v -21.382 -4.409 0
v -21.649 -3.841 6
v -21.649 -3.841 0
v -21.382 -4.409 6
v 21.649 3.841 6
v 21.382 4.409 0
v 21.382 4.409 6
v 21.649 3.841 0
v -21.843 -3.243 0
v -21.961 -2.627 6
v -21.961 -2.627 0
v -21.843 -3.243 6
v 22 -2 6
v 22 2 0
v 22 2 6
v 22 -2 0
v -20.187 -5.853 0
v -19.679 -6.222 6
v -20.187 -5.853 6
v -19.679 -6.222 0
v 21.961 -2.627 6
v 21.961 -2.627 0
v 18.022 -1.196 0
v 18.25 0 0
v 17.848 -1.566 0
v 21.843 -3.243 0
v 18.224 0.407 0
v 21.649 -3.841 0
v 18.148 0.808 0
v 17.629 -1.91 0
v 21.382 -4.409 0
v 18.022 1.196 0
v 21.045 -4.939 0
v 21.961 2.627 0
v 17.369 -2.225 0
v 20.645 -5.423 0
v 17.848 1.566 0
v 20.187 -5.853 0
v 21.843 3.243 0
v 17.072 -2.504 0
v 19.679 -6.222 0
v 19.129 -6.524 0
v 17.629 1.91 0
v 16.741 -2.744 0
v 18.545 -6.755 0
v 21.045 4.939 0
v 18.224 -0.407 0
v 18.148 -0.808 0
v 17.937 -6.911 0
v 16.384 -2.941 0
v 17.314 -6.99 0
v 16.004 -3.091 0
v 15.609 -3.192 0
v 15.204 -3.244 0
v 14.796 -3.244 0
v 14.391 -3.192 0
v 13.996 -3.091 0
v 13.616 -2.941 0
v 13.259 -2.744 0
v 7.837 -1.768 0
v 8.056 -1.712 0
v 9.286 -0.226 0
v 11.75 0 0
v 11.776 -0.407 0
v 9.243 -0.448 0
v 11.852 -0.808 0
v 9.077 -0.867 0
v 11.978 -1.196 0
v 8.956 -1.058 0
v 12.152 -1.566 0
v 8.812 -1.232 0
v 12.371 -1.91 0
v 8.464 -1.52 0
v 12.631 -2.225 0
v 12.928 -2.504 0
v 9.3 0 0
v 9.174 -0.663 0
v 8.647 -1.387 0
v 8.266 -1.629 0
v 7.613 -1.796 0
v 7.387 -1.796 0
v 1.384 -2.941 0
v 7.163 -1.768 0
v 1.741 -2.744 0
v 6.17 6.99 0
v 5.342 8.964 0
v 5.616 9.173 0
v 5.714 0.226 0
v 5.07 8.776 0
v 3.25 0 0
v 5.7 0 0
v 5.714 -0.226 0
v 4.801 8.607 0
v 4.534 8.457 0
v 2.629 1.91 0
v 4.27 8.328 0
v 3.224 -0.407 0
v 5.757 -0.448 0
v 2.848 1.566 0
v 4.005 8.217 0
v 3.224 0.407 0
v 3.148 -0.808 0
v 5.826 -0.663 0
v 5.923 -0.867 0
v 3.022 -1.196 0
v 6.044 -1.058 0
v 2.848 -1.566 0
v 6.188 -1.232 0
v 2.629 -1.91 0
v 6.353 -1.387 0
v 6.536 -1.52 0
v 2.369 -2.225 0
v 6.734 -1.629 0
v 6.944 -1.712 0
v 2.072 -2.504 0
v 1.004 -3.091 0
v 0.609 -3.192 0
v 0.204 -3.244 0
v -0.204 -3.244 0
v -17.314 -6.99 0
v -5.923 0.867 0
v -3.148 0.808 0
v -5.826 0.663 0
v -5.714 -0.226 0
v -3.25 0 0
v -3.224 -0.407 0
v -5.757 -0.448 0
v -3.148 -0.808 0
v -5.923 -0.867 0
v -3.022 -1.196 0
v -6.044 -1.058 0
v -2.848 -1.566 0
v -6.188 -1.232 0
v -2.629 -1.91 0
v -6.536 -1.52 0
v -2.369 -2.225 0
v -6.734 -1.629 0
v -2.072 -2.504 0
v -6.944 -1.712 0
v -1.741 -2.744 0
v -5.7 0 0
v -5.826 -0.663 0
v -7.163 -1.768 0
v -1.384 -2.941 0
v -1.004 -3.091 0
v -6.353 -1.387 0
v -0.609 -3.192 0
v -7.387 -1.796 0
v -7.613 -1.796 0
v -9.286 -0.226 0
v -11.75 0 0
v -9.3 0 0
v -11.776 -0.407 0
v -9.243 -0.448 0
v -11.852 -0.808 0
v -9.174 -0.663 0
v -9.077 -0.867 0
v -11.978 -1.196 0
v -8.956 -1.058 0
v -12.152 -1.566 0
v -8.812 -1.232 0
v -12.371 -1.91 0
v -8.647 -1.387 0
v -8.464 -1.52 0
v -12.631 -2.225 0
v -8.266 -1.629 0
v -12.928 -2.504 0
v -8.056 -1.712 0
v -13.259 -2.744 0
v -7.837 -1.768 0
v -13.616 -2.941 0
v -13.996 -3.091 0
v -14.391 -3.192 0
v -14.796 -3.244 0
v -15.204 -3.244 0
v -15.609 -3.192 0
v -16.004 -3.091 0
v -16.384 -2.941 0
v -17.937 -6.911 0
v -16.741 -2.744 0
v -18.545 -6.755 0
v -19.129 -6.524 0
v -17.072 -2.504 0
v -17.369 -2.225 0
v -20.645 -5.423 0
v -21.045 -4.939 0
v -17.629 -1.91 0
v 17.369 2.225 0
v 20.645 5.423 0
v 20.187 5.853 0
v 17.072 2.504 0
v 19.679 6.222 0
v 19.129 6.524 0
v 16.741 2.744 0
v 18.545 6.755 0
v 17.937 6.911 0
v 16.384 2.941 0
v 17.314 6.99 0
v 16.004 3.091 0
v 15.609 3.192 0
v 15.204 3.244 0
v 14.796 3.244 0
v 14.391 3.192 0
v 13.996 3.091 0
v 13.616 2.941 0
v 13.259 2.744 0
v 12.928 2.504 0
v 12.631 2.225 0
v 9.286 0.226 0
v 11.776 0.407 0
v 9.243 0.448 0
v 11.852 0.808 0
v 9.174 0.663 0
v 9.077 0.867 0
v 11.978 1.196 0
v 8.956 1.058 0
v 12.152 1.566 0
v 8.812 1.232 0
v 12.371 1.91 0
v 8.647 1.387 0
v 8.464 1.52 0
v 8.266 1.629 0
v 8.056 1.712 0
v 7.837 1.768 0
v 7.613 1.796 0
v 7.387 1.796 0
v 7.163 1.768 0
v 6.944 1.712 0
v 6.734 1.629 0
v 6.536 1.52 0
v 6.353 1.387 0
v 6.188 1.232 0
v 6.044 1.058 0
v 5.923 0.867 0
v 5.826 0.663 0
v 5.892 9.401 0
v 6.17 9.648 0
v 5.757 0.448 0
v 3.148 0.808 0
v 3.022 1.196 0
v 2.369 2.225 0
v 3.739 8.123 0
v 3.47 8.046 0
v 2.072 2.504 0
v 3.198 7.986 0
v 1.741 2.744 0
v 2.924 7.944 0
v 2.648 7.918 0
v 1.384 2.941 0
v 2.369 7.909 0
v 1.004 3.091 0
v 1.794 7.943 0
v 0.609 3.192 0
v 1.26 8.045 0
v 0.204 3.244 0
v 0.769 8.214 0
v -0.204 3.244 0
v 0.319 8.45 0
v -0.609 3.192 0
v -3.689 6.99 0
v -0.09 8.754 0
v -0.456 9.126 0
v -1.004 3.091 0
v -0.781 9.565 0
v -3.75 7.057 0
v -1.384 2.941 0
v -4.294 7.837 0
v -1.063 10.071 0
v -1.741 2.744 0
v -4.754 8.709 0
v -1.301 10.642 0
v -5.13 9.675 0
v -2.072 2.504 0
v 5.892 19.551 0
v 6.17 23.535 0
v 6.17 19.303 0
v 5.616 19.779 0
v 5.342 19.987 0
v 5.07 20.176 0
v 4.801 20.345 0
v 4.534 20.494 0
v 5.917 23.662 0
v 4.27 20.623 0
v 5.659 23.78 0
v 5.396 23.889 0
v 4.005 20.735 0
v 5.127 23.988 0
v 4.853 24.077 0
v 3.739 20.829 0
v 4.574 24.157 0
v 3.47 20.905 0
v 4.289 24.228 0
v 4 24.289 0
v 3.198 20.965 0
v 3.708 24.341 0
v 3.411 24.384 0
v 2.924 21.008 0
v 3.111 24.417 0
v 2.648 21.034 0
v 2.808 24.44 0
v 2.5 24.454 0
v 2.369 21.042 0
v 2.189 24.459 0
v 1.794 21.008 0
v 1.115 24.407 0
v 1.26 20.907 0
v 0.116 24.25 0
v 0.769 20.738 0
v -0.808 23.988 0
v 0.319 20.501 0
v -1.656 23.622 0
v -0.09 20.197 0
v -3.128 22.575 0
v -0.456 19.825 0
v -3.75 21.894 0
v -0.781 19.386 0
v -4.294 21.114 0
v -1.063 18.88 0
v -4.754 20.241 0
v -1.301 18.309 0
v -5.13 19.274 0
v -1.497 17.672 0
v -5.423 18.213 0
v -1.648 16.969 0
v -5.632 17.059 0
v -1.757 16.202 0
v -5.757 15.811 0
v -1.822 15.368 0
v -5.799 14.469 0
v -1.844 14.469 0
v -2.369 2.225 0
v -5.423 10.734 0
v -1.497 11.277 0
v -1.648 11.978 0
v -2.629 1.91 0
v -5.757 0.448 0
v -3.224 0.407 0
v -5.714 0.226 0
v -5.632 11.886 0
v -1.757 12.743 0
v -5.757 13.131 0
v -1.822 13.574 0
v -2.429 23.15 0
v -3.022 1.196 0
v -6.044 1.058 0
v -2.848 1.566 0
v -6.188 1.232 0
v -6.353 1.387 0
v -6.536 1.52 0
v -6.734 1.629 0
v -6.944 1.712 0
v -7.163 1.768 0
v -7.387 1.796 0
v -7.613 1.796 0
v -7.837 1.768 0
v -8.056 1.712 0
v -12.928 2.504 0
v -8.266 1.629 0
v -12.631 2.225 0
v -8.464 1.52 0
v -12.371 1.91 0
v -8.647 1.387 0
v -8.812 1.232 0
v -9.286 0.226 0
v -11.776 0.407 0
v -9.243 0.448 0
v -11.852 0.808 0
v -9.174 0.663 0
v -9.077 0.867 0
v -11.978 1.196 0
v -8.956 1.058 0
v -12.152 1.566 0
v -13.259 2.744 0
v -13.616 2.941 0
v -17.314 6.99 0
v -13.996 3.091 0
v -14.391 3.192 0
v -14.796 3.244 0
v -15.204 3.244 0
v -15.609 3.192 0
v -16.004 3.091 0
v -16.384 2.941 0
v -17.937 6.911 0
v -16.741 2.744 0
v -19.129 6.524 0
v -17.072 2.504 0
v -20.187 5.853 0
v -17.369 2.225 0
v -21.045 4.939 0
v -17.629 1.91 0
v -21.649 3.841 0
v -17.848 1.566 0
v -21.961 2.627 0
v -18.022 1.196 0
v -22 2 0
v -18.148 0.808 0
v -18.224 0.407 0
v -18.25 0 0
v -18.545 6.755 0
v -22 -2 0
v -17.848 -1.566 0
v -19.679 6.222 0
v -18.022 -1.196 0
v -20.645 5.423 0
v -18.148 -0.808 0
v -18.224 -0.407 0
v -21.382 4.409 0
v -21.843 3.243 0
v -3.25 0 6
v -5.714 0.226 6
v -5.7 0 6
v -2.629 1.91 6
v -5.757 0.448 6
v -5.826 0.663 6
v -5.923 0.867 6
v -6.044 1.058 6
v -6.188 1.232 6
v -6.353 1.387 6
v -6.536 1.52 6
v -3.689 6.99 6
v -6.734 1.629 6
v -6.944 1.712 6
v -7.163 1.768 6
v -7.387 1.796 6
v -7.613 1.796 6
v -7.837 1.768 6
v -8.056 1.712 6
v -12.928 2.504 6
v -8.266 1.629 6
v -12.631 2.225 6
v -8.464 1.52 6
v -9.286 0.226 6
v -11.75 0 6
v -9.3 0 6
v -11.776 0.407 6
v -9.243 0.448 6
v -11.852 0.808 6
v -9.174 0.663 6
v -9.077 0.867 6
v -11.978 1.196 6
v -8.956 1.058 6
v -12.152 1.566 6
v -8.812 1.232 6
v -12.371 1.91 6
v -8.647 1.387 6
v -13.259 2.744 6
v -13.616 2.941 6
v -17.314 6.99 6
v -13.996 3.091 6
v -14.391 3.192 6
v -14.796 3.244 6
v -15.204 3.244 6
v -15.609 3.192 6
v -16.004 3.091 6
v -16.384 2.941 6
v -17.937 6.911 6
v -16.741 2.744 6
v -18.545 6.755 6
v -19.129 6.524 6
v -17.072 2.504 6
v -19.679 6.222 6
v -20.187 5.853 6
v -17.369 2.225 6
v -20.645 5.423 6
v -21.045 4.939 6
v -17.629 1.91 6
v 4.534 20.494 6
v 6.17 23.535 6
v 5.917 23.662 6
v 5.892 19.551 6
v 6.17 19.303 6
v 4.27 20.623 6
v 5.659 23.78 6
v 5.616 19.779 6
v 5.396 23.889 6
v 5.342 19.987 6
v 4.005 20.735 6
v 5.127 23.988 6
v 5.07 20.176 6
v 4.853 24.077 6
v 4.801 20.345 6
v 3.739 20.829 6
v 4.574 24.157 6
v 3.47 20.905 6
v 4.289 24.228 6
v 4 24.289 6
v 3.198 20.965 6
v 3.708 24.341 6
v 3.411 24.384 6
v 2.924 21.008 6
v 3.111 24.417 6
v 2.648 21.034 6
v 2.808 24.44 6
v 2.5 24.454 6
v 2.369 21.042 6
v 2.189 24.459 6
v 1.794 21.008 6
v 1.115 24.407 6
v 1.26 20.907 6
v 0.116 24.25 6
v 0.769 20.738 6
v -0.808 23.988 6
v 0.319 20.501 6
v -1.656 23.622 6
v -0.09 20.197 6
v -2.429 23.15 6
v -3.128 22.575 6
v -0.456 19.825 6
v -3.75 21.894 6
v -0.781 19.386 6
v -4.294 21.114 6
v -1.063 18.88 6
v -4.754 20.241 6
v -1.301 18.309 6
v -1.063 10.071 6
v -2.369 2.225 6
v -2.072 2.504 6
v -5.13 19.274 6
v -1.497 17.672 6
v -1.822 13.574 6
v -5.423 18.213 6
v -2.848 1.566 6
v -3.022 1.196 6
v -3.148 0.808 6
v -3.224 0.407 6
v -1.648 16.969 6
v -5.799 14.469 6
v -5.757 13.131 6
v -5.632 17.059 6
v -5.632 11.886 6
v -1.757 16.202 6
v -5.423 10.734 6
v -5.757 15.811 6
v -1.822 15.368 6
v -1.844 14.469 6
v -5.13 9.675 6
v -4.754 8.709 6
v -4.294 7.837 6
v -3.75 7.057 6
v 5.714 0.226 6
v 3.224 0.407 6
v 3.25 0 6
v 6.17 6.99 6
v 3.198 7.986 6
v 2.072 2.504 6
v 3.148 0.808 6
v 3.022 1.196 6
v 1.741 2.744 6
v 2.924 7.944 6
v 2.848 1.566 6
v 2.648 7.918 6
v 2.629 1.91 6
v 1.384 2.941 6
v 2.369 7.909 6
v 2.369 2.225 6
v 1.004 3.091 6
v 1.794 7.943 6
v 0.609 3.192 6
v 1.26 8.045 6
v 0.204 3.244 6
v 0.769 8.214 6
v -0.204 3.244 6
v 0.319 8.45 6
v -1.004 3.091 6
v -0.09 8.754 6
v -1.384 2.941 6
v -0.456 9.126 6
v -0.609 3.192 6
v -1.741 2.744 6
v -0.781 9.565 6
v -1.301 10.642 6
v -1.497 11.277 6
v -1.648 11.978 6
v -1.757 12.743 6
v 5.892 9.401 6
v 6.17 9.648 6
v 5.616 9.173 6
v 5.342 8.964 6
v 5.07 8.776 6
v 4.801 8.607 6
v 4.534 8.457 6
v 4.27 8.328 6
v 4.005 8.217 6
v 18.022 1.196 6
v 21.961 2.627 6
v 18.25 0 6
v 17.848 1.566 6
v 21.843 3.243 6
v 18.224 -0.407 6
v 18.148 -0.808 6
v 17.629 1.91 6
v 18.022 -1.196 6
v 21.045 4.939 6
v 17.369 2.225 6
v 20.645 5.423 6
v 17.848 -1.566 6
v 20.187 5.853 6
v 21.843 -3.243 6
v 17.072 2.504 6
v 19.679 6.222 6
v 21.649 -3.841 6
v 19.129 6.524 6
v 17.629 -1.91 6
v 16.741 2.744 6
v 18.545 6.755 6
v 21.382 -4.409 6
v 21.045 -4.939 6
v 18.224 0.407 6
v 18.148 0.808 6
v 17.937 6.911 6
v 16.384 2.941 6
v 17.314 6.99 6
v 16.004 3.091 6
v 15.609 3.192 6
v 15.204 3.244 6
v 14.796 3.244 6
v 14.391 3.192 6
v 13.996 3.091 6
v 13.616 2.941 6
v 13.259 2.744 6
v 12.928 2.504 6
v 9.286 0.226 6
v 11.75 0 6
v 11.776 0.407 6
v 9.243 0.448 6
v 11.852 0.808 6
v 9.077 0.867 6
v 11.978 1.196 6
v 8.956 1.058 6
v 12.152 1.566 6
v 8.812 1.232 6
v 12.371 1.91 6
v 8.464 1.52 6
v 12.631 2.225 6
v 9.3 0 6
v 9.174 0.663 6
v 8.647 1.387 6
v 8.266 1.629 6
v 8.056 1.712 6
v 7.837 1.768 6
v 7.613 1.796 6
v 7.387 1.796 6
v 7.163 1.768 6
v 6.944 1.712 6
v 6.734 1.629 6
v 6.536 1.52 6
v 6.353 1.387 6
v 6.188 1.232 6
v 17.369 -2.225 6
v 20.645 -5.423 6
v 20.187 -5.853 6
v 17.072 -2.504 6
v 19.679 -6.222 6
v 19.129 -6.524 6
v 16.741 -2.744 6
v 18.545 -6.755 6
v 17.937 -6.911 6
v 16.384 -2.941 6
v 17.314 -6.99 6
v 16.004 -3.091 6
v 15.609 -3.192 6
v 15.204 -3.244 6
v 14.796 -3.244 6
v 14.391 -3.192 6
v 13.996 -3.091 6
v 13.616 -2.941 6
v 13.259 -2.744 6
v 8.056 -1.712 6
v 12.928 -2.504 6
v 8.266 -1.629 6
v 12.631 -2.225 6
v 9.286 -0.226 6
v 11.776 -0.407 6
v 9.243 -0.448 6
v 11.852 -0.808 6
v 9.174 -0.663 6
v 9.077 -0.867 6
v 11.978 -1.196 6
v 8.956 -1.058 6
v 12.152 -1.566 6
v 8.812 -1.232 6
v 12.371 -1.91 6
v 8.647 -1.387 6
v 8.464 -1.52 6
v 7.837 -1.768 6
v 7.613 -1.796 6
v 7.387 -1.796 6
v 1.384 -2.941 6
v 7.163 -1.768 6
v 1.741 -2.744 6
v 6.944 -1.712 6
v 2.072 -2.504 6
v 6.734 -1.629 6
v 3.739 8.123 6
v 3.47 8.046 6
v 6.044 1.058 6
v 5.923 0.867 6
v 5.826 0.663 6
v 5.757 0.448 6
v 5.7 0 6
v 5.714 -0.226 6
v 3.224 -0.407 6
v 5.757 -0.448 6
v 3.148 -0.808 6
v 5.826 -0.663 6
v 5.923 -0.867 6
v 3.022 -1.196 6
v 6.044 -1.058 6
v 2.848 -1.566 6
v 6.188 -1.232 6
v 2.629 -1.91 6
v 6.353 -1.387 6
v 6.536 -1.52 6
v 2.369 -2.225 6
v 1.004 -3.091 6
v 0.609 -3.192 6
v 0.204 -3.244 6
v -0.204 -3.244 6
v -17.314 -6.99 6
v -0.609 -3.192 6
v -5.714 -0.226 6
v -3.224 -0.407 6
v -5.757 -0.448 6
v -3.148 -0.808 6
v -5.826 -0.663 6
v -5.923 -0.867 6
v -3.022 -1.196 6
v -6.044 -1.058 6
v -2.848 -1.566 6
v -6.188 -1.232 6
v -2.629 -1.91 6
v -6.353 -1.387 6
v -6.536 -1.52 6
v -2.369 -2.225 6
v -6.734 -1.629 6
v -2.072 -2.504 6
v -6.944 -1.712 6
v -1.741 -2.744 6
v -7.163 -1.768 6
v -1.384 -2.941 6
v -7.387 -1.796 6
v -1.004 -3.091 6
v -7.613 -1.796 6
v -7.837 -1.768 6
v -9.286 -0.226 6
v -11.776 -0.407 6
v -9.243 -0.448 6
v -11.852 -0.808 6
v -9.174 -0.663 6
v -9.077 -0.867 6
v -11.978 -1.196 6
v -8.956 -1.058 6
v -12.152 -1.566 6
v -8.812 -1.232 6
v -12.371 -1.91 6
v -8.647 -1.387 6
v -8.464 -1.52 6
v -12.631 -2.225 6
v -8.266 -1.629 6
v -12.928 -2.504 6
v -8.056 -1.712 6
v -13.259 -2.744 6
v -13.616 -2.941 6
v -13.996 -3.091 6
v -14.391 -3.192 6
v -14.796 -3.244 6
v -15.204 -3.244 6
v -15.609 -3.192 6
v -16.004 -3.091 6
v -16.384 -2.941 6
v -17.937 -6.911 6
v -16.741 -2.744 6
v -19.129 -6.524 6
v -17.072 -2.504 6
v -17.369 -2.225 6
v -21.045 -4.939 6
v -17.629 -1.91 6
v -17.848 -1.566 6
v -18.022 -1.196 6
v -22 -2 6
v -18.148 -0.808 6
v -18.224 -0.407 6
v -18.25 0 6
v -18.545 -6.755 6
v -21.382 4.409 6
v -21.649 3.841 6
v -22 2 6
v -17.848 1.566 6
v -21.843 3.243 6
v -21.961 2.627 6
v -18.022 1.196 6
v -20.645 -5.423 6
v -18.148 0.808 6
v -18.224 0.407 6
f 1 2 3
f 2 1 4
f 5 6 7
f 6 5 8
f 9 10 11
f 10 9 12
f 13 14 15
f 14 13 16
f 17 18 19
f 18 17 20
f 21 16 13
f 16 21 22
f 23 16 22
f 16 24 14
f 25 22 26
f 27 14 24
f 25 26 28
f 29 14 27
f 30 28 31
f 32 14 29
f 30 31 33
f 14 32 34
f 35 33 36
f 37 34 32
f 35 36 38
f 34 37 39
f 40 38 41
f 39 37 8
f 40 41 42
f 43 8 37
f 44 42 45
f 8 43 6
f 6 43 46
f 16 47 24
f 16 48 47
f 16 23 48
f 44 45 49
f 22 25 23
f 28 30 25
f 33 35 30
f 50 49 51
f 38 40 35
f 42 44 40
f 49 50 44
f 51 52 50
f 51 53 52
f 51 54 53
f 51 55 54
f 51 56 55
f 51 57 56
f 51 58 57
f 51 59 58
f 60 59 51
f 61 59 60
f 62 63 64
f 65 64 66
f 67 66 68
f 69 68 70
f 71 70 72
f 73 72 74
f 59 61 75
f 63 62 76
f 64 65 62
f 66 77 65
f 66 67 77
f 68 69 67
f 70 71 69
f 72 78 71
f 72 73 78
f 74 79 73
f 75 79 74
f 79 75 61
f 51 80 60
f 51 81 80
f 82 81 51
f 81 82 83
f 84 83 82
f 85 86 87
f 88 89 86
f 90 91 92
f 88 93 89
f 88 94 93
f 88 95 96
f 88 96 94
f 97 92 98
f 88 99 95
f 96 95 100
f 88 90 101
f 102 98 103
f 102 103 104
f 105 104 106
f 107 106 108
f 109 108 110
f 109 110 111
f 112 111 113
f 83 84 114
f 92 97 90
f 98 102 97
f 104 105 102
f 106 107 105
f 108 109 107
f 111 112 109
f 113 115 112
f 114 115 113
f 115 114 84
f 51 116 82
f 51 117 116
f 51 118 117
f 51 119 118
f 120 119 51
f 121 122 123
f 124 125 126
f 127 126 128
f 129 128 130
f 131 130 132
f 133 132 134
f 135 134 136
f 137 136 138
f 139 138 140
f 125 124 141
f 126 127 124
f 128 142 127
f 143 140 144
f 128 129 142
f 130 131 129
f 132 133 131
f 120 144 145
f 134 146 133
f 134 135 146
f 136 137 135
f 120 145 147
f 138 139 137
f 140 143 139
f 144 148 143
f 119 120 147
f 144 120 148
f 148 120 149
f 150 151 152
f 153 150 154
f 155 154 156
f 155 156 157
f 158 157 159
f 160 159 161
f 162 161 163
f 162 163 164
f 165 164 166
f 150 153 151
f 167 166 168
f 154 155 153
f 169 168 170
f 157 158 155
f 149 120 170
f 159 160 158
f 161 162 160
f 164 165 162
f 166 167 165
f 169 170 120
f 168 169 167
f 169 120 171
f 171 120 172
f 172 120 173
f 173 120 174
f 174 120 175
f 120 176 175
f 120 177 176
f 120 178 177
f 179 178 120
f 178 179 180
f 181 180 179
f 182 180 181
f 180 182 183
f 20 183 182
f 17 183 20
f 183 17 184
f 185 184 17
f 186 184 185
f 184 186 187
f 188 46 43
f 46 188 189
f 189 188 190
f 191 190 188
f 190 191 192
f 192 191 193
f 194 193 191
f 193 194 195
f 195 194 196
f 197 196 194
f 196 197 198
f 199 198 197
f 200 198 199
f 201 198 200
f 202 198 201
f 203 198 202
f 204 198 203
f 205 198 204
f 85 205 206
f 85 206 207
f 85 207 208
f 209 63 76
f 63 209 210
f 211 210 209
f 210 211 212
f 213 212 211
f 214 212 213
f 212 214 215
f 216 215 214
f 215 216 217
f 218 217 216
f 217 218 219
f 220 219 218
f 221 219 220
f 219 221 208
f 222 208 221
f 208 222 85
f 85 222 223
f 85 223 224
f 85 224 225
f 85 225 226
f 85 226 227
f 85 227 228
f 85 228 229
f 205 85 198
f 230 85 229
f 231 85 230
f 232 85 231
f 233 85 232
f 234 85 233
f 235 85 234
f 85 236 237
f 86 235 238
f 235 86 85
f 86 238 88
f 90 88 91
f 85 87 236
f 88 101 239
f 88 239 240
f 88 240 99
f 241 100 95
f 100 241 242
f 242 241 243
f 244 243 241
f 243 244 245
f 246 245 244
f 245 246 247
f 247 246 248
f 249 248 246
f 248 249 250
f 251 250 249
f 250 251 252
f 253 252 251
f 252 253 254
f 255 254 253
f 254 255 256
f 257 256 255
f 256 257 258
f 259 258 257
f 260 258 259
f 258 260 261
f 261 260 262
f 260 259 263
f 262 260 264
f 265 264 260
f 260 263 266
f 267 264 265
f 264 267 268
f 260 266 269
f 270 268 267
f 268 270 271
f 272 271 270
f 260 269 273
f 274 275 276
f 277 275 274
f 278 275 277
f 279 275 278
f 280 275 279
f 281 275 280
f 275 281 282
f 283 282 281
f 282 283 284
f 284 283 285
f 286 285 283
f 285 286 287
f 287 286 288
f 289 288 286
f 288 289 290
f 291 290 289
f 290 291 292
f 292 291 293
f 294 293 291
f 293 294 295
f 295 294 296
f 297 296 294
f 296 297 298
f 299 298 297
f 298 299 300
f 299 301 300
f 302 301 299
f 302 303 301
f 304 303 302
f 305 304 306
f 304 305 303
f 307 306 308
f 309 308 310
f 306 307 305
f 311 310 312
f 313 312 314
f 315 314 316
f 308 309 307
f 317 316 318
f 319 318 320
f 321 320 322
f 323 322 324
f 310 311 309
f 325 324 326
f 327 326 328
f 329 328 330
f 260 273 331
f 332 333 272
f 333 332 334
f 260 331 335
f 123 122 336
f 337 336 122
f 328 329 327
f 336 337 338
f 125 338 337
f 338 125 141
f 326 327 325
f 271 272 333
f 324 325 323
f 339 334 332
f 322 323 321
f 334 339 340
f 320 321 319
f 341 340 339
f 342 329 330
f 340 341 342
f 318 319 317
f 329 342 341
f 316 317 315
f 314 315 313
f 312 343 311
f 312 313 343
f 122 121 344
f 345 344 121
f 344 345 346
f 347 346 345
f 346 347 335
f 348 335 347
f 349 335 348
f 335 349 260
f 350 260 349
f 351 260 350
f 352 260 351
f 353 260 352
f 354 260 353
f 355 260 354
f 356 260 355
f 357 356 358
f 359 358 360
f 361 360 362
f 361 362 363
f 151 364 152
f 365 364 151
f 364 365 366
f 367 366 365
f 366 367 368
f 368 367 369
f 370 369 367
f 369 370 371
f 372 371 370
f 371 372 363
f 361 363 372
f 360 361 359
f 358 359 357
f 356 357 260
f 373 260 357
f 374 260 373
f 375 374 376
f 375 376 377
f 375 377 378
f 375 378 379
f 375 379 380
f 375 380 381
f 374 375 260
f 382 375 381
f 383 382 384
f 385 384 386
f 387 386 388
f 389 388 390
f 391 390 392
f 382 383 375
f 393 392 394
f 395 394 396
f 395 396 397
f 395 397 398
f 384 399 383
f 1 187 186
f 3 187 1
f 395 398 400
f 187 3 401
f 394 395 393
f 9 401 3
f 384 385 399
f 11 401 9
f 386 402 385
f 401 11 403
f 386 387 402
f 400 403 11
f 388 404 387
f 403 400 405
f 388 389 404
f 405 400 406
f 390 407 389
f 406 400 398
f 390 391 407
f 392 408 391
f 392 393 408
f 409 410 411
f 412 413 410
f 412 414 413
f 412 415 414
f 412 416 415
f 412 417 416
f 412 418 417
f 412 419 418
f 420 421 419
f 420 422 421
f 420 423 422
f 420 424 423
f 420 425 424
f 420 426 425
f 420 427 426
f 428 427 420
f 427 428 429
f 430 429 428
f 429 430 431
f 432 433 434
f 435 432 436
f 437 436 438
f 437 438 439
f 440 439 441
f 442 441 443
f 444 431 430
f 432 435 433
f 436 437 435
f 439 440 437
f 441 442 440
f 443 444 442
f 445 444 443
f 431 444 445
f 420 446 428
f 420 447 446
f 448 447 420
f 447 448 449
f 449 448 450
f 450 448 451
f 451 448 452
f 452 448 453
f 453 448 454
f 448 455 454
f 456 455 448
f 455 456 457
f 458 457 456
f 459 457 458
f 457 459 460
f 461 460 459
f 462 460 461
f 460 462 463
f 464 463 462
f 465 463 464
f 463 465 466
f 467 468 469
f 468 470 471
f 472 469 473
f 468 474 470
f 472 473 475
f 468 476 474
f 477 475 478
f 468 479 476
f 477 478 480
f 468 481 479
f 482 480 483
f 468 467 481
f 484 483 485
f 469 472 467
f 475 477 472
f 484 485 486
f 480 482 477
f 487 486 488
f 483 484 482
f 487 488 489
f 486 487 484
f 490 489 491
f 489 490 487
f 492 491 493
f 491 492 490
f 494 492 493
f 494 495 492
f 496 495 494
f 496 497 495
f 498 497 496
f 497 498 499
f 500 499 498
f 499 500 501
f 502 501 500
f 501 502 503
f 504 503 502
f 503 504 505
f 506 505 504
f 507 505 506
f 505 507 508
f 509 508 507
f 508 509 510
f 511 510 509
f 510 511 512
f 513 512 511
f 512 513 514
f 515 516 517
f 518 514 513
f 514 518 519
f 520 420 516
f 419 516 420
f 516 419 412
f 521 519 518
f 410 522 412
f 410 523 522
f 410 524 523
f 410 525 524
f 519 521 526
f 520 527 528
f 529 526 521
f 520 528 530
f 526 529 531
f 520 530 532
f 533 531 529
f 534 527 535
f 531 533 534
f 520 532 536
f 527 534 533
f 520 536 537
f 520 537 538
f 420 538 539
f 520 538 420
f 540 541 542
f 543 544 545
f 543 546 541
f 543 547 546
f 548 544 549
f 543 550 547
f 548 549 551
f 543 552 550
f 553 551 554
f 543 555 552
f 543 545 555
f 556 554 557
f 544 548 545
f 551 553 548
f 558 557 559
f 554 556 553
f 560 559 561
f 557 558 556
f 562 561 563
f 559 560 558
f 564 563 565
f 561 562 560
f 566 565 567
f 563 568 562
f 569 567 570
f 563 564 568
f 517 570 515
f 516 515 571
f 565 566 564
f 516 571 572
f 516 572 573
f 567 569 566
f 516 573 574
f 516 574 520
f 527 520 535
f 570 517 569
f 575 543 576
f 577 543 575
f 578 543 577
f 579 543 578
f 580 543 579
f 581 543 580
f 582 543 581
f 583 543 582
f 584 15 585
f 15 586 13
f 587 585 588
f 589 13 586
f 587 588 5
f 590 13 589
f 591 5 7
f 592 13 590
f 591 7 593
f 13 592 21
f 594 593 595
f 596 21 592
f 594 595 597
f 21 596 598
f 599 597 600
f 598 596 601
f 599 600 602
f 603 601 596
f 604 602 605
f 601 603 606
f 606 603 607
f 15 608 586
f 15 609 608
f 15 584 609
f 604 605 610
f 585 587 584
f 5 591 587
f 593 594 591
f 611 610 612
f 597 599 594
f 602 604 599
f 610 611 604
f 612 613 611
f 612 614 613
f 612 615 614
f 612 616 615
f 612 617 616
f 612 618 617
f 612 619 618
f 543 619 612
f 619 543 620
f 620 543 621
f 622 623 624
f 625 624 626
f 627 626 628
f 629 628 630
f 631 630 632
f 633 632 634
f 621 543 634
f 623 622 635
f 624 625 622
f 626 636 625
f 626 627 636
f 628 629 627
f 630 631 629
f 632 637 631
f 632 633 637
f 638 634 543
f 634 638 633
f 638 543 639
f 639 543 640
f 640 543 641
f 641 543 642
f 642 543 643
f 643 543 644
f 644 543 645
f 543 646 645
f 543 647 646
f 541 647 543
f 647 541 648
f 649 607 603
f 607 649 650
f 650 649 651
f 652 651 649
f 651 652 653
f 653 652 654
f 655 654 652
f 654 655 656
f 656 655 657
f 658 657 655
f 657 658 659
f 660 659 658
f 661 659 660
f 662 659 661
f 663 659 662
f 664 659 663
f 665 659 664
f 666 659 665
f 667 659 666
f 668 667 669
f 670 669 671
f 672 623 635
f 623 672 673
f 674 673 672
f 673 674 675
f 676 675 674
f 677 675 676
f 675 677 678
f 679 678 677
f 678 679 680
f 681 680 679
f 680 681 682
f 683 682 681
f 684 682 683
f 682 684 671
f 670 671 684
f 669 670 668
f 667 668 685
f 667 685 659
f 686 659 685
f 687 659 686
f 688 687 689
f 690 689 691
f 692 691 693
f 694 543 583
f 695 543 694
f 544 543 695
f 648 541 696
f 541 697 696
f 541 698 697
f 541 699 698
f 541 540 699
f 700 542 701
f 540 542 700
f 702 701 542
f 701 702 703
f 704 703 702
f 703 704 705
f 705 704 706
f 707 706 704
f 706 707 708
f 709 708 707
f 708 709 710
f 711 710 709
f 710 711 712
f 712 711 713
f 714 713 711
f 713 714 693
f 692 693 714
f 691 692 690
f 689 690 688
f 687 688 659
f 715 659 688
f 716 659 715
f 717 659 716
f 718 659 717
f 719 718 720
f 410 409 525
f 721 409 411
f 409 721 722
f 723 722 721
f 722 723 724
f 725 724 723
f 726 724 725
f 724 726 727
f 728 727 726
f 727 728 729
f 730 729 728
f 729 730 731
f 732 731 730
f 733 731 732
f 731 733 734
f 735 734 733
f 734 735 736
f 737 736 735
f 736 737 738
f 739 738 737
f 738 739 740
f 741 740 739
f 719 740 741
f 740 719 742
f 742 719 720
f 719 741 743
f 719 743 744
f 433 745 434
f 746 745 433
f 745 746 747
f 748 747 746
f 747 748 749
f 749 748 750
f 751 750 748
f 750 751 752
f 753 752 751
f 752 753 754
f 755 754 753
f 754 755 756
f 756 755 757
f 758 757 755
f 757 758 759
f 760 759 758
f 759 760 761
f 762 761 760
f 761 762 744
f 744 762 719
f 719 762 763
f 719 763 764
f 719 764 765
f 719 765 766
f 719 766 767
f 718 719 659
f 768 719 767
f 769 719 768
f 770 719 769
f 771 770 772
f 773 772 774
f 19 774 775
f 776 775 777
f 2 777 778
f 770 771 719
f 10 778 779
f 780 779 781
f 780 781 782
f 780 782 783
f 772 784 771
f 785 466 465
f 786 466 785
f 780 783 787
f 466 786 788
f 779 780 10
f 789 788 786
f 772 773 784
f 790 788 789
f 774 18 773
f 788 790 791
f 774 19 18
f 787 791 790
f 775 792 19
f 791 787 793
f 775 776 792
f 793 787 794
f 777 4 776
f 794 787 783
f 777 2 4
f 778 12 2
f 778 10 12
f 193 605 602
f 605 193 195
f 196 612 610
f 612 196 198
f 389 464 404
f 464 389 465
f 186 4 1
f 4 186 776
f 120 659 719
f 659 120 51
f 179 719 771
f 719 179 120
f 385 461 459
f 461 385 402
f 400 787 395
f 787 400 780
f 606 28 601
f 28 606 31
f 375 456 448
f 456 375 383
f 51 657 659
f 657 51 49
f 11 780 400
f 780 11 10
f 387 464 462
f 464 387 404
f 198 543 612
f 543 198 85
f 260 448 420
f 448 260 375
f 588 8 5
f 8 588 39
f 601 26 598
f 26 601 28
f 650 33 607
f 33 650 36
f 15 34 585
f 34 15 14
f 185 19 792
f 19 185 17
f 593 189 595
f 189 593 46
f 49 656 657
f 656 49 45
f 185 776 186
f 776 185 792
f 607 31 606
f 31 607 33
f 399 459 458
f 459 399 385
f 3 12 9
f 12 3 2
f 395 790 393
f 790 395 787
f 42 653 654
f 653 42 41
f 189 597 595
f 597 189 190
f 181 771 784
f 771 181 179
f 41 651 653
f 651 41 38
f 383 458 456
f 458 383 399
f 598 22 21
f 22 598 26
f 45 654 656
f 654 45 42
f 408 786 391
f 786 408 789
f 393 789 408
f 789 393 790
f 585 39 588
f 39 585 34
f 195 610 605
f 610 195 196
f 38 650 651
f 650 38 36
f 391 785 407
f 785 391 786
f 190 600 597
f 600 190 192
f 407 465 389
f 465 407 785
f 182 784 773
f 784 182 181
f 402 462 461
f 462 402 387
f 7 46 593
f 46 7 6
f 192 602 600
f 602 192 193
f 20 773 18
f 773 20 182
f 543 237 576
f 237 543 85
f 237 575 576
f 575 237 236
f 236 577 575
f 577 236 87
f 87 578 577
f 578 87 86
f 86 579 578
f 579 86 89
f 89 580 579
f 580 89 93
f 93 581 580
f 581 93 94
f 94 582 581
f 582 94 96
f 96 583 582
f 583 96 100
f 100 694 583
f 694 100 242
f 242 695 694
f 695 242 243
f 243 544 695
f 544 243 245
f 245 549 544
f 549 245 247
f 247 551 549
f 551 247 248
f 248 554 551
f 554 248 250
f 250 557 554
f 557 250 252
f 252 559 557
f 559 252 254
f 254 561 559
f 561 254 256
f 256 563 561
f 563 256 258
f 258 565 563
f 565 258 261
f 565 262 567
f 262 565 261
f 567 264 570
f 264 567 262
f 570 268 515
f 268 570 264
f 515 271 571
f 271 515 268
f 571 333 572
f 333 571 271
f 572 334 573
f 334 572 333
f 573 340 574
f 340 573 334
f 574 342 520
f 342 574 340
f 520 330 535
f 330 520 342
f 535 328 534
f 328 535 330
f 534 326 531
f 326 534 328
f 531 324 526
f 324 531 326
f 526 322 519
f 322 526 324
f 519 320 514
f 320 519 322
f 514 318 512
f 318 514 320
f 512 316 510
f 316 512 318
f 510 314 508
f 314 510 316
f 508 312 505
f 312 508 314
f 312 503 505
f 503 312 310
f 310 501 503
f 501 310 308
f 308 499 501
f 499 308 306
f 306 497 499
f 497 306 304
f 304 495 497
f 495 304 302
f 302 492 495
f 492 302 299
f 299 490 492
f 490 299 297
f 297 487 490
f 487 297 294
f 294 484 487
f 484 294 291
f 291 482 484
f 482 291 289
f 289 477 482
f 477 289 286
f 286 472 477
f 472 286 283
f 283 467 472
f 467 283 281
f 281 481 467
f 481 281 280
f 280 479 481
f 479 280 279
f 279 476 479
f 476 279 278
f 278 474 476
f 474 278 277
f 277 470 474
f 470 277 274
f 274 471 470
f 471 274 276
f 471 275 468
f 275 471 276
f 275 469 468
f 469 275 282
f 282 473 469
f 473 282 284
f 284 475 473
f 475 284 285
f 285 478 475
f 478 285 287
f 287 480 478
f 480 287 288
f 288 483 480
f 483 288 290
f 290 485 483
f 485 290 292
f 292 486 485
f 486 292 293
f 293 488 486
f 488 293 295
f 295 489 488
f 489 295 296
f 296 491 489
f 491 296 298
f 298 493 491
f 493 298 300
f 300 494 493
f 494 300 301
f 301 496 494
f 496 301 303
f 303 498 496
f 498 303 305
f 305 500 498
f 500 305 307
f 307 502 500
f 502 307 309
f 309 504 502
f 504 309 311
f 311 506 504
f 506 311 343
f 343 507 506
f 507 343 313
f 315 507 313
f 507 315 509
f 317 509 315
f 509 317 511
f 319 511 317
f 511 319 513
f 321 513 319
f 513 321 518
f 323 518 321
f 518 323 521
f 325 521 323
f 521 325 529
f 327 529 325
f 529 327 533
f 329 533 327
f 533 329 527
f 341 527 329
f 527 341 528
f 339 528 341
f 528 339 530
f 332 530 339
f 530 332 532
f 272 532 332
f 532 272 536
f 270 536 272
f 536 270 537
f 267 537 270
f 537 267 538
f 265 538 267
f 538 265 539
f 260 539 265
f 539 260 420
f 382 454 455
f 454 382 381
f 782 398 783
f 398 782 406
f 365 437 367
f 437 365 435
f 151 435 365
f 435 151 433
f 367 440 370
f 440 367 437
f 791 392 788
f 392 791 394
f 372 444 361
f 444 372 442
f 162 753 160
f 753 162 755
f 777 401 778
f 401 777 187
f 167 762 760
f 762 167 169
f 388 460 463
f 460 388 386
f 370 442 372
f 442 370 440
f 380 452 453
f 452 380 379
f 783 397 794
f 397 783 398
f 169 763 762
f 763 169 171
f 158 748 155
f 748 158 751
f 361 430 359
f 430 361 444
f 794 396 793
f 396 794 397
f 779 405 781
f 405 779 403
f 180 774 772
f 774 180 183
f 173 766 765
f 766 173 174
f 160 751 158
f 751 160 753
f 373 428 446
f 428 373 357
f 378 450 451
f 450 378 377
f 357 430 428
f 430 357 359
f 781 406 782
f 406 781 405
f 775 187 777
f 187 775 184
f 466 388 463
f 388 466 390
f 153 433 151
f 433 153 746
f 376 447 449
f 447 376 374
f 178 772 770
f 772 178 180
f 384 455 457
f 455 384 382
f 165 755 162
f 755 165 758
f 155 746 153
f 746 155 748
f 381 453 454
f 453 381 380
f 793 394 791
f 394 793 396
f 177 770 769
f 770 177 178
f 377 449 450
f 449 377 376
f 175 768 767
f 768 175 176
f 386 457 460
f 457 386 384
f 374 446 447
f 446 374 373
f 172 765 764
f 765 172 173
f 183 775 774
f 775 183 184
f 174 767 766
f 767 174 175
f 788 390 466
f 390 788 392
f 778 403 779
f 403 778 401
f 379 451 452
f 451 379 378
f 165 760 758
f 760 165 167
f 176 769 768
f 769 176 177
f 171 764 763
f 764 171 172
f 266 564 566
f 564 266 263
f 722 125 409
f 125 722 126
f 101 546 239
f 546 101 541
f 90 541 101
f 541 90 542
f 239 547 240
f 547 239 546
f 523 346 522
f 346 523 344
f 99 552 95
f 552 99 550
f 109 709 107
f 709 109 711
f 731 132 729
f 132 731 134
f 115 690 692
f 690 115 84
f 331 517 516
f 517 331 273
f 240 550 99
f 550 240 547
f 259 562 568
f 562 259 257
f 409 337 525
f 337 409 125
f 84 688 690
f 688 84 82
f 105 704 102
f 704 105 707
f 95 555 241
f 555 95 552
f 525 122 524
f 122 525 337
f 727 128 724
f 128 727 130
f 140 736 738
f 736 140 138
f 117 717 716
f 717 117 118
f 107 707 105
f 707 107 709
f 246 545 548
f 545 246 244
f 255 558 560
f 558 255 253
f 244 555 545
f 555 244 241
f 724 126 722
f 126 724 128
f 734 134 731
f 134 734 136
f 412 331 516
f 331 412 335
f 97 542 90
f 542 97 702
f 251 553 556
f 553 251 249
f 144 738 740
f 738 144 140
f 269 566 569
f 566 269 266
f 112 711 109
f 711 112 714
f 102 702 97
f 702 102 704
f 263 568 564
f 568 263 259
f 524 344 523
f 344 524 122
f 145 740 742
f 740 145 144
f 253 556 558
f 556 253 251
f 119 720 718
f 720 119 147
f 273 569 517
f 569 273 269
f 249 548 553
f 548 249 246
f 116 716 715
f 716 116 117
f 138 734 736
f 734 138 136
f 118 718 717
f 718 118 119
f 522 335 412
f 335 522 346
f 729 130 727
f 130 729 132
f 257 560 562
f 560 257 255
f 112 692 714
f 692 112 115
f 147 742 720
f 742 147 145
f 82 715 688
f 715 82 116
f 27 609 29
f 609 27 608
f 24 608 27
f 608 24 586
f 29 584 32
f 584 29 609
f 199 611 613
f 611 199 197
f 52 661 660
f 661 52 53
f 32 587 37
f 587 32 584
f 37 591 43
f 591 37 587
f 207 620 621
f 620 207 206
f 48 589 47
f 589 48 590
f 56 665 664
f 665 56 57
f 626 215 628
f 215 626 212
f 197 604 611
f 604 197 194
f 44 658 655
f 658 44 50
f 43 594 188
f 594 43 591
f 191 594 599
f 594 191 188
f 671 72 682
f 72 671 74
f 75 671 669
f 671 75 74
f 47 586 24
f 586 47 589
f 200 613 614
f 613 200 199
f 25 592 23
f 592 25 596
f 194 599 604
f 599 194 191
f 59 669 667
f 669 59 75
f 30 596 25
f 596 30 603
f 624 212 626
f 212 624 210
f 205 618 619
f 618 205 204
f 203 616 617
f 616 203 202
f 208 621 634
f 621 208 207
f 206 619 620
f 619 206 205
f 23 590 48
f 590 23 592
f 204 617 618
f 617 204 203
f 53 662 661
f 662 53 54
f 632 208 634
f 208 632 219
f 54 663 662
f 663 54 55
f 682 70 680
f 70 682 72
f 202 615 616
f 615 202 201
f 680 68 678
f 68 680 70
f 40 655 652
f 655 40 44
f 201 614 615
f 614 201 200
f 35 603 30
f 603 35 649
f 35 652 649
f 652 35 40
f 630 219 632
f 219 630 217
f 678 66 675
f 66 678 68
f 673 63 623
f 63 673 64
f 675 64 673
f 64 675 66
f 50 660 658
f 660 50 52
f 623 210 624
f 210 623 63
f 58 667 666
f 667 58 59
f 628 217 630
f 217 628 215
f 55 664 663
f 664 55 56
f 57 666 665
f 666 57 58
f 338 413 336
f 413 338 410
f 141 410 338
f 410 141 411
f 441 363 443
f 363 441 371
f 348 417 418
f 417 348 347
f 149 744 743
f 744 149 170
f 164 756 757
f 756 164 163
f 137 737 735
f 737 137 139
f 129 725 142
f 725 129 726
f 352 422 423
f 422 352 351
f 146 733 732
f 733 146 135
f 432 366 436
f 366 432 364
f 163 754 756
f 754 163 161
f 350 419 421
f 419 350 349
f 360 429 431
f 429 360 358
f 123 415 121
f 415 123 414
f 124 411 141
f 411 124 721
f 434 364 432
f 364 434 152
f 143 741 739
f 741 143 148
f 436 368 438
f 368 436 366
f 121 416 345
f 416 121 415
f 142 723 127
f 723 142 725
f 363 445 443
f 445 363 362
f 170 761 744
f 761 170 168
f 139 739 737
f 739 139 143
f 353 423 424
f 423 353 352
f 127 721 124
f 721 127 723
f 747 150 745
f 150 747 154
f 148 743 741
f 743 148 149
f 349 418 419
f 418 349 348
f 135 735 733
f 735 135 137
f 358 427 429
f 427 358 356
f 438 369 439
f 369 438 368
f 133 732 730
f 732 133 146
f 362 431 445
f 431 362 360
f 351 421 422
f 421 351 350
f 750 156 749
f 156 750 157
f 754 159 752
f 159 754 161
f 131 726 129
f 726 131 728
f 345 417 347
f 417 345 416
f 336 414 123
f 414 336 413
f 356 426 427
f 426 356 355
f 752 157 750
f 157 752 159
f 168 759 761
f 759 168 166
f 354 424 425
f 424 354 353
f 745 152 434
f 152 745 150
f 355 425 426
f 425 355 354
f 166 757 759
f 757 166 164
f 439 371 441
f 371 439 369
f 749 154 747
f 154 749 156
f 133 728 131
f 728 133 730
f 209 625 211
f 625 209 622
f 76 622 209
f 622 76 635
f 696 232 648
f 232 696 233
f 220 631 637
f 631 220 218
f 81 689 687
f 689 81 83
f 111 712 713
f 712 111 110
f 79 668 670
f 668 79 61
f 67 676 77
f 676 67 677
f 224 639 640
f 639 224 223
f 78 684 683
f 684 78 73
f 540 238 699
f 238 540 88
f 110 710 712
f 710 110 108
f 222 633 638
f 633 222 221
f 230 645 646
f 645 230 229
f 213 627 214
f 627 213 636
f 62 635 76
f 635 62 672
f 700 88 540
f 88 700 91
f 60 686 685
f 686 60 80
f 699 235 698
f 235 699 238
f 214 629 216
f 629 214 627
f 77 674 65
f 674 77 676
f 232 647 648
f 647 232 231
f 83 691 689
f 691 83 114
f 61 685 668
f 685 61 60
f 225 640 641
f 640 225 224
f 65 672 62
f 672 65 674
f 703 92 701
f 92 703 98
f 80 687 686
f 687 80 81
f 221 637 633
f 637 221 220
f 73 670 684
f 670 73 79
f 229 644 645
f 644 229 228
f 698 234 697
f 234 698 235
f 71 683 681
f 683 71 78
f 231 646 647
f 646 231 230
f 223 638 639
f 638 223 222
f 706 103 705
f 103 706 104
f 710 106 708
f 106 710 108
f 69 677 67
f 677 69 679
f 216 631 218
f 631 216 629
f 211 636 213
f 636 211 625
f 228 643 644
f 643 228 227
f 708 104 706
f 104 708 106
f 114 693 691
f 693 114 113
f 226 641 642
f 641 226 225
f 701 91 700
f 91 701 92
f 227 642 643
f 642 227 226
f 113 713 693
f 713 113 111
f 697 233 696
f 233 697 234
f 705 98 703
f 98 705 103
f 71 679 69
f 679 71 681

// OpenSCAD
$fn = 50;


difference() {
	union() {
		hull() {
			translate(v = [-17.0000000000, 2.0000000000, 0]) {
				cylinder(h = 6, r = 5);
			}
			translate(v = [17.0000000000, 2.0000000000, 0]) {
				cylinder(h = 6, r = 5);
			}
			translate(v = [-17.0000000000, -2.0000000000, 0]) {
				cylinder(h = 6, r = 5);
			}
			translate(v = [17.0000000000, -2.0000000000, 0]) {
				cylinder(h = 6, r = 5);
			}
		}
		translate(v = [0, 24, 0]) {
			linear_extrude(height = 6) {
				text(font = "DejaVu Sans Mono:style=Bold", halign = "center", size = 19.0000000000, text = "C", valign = "top");
			}
		}
	}
	union() {
		translate(v = [-15.0000000000, 0.0000000000, 0]) {
			translate(v = [0, 0, -100]) {
				cylinder(h = 200, r = 3.2500000000);
			}
		}
		translate(v = [0, 0, -100]) {
			cylinder(h = 200, r = 3.2500000000);
		}
		translate(v = [15.0000000000, 0.0000000000, 0]) {
			translate(v = [0, 0, -100]) {
				cylinder(h = 200, r = 3.2500000000);
			}
		}
		translate(v = [-15.0000000000, 0.0000000000, 0]) {
			translate(v = [0, 0, -100]) {
				cylinder(h = 200, r = 1.8000000000);
			}
		}
		translate(v = [-7.5000000000, 0.0000000000, 0]) {
			translate(v = [0, 0, -100]) {
				cylinder(h = 200, r = 1.8000000000);
			}
		}
		translate(v = [0, 0, -100]) {
			cylinder(h = 200, r = 1.8000000000);
		}
		translate(v = [7.5000000000, 0.0000000000, 0]) {
			translate(v = [0, 0, -100]) {
				cylinder(h = 200, r = 1.8000000000);
			}
		}
		translate(v = [15.0000000000, 0.0000000000, 0]) {
			translate(v = [0, 0, -100]) {
				cylinder(h = 200, r = 1.8000000000);
			}
		}
	}
}
